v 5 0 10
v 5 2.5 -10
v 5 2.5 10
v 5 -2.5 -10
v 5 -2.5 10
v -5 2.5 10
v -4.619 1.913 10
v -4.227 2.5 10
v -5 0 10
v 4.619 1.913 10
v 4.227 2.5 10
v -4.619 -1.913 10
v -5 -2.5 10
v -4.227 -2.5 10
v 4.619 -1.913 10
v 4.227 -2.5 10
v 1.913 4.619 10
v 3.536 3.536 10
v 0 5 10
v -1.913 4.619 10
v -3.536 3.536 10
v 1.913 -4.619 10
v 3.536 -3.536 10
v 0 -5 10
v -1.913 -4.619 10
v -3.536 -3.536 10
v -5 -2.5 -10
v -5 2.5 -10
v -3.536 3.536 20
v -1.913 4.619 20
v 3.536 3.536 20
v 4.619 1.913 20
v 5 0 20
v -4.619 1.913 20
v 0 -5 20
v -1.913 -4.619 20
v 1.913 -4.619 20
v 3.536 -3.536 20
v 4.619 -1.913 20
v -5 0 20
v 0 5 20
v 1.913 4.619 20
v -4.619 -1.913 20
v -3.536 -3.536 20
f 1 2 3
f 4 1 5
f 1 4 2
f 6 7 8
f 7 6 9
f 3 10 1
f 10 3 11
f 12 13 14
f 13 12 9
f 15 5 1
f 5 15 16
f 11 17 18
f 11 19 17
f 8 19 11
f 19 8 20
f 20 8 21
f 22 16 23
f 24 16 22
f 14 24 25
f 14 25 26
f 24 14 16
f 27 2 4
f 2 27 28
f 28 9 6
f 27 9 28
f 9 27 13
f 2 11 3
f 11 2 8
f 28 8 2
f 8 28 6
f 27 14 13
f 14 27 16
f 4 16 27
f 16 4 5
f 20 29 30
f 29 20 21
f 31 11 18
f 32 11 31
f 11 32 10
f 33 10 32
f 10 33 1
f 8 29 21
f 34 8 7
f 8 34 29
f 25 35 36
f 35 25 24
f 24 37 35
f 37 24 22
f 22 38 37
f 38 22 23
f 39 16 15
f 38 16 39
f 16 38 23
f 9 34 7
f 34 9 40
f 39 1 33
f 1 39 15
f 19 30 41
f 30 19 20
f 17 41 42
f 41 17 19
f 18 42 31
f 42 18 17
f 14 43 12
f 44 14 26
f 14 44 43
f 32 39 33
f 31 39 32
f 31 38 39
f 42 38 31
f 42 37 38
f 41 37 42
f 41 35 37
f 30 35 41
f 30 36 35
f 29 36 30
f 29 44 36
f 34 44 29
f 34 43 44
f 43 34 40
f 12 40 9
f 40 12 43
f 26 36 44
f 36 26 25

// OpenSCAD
// cube height
height = 20;
// cube width
width = 10;
// cube depth
depth = 5;
union(){
    cube([width,depth,height],center = true);
    translate([0,0,10]){
        cylinder(10, r = 5);
    }
}
